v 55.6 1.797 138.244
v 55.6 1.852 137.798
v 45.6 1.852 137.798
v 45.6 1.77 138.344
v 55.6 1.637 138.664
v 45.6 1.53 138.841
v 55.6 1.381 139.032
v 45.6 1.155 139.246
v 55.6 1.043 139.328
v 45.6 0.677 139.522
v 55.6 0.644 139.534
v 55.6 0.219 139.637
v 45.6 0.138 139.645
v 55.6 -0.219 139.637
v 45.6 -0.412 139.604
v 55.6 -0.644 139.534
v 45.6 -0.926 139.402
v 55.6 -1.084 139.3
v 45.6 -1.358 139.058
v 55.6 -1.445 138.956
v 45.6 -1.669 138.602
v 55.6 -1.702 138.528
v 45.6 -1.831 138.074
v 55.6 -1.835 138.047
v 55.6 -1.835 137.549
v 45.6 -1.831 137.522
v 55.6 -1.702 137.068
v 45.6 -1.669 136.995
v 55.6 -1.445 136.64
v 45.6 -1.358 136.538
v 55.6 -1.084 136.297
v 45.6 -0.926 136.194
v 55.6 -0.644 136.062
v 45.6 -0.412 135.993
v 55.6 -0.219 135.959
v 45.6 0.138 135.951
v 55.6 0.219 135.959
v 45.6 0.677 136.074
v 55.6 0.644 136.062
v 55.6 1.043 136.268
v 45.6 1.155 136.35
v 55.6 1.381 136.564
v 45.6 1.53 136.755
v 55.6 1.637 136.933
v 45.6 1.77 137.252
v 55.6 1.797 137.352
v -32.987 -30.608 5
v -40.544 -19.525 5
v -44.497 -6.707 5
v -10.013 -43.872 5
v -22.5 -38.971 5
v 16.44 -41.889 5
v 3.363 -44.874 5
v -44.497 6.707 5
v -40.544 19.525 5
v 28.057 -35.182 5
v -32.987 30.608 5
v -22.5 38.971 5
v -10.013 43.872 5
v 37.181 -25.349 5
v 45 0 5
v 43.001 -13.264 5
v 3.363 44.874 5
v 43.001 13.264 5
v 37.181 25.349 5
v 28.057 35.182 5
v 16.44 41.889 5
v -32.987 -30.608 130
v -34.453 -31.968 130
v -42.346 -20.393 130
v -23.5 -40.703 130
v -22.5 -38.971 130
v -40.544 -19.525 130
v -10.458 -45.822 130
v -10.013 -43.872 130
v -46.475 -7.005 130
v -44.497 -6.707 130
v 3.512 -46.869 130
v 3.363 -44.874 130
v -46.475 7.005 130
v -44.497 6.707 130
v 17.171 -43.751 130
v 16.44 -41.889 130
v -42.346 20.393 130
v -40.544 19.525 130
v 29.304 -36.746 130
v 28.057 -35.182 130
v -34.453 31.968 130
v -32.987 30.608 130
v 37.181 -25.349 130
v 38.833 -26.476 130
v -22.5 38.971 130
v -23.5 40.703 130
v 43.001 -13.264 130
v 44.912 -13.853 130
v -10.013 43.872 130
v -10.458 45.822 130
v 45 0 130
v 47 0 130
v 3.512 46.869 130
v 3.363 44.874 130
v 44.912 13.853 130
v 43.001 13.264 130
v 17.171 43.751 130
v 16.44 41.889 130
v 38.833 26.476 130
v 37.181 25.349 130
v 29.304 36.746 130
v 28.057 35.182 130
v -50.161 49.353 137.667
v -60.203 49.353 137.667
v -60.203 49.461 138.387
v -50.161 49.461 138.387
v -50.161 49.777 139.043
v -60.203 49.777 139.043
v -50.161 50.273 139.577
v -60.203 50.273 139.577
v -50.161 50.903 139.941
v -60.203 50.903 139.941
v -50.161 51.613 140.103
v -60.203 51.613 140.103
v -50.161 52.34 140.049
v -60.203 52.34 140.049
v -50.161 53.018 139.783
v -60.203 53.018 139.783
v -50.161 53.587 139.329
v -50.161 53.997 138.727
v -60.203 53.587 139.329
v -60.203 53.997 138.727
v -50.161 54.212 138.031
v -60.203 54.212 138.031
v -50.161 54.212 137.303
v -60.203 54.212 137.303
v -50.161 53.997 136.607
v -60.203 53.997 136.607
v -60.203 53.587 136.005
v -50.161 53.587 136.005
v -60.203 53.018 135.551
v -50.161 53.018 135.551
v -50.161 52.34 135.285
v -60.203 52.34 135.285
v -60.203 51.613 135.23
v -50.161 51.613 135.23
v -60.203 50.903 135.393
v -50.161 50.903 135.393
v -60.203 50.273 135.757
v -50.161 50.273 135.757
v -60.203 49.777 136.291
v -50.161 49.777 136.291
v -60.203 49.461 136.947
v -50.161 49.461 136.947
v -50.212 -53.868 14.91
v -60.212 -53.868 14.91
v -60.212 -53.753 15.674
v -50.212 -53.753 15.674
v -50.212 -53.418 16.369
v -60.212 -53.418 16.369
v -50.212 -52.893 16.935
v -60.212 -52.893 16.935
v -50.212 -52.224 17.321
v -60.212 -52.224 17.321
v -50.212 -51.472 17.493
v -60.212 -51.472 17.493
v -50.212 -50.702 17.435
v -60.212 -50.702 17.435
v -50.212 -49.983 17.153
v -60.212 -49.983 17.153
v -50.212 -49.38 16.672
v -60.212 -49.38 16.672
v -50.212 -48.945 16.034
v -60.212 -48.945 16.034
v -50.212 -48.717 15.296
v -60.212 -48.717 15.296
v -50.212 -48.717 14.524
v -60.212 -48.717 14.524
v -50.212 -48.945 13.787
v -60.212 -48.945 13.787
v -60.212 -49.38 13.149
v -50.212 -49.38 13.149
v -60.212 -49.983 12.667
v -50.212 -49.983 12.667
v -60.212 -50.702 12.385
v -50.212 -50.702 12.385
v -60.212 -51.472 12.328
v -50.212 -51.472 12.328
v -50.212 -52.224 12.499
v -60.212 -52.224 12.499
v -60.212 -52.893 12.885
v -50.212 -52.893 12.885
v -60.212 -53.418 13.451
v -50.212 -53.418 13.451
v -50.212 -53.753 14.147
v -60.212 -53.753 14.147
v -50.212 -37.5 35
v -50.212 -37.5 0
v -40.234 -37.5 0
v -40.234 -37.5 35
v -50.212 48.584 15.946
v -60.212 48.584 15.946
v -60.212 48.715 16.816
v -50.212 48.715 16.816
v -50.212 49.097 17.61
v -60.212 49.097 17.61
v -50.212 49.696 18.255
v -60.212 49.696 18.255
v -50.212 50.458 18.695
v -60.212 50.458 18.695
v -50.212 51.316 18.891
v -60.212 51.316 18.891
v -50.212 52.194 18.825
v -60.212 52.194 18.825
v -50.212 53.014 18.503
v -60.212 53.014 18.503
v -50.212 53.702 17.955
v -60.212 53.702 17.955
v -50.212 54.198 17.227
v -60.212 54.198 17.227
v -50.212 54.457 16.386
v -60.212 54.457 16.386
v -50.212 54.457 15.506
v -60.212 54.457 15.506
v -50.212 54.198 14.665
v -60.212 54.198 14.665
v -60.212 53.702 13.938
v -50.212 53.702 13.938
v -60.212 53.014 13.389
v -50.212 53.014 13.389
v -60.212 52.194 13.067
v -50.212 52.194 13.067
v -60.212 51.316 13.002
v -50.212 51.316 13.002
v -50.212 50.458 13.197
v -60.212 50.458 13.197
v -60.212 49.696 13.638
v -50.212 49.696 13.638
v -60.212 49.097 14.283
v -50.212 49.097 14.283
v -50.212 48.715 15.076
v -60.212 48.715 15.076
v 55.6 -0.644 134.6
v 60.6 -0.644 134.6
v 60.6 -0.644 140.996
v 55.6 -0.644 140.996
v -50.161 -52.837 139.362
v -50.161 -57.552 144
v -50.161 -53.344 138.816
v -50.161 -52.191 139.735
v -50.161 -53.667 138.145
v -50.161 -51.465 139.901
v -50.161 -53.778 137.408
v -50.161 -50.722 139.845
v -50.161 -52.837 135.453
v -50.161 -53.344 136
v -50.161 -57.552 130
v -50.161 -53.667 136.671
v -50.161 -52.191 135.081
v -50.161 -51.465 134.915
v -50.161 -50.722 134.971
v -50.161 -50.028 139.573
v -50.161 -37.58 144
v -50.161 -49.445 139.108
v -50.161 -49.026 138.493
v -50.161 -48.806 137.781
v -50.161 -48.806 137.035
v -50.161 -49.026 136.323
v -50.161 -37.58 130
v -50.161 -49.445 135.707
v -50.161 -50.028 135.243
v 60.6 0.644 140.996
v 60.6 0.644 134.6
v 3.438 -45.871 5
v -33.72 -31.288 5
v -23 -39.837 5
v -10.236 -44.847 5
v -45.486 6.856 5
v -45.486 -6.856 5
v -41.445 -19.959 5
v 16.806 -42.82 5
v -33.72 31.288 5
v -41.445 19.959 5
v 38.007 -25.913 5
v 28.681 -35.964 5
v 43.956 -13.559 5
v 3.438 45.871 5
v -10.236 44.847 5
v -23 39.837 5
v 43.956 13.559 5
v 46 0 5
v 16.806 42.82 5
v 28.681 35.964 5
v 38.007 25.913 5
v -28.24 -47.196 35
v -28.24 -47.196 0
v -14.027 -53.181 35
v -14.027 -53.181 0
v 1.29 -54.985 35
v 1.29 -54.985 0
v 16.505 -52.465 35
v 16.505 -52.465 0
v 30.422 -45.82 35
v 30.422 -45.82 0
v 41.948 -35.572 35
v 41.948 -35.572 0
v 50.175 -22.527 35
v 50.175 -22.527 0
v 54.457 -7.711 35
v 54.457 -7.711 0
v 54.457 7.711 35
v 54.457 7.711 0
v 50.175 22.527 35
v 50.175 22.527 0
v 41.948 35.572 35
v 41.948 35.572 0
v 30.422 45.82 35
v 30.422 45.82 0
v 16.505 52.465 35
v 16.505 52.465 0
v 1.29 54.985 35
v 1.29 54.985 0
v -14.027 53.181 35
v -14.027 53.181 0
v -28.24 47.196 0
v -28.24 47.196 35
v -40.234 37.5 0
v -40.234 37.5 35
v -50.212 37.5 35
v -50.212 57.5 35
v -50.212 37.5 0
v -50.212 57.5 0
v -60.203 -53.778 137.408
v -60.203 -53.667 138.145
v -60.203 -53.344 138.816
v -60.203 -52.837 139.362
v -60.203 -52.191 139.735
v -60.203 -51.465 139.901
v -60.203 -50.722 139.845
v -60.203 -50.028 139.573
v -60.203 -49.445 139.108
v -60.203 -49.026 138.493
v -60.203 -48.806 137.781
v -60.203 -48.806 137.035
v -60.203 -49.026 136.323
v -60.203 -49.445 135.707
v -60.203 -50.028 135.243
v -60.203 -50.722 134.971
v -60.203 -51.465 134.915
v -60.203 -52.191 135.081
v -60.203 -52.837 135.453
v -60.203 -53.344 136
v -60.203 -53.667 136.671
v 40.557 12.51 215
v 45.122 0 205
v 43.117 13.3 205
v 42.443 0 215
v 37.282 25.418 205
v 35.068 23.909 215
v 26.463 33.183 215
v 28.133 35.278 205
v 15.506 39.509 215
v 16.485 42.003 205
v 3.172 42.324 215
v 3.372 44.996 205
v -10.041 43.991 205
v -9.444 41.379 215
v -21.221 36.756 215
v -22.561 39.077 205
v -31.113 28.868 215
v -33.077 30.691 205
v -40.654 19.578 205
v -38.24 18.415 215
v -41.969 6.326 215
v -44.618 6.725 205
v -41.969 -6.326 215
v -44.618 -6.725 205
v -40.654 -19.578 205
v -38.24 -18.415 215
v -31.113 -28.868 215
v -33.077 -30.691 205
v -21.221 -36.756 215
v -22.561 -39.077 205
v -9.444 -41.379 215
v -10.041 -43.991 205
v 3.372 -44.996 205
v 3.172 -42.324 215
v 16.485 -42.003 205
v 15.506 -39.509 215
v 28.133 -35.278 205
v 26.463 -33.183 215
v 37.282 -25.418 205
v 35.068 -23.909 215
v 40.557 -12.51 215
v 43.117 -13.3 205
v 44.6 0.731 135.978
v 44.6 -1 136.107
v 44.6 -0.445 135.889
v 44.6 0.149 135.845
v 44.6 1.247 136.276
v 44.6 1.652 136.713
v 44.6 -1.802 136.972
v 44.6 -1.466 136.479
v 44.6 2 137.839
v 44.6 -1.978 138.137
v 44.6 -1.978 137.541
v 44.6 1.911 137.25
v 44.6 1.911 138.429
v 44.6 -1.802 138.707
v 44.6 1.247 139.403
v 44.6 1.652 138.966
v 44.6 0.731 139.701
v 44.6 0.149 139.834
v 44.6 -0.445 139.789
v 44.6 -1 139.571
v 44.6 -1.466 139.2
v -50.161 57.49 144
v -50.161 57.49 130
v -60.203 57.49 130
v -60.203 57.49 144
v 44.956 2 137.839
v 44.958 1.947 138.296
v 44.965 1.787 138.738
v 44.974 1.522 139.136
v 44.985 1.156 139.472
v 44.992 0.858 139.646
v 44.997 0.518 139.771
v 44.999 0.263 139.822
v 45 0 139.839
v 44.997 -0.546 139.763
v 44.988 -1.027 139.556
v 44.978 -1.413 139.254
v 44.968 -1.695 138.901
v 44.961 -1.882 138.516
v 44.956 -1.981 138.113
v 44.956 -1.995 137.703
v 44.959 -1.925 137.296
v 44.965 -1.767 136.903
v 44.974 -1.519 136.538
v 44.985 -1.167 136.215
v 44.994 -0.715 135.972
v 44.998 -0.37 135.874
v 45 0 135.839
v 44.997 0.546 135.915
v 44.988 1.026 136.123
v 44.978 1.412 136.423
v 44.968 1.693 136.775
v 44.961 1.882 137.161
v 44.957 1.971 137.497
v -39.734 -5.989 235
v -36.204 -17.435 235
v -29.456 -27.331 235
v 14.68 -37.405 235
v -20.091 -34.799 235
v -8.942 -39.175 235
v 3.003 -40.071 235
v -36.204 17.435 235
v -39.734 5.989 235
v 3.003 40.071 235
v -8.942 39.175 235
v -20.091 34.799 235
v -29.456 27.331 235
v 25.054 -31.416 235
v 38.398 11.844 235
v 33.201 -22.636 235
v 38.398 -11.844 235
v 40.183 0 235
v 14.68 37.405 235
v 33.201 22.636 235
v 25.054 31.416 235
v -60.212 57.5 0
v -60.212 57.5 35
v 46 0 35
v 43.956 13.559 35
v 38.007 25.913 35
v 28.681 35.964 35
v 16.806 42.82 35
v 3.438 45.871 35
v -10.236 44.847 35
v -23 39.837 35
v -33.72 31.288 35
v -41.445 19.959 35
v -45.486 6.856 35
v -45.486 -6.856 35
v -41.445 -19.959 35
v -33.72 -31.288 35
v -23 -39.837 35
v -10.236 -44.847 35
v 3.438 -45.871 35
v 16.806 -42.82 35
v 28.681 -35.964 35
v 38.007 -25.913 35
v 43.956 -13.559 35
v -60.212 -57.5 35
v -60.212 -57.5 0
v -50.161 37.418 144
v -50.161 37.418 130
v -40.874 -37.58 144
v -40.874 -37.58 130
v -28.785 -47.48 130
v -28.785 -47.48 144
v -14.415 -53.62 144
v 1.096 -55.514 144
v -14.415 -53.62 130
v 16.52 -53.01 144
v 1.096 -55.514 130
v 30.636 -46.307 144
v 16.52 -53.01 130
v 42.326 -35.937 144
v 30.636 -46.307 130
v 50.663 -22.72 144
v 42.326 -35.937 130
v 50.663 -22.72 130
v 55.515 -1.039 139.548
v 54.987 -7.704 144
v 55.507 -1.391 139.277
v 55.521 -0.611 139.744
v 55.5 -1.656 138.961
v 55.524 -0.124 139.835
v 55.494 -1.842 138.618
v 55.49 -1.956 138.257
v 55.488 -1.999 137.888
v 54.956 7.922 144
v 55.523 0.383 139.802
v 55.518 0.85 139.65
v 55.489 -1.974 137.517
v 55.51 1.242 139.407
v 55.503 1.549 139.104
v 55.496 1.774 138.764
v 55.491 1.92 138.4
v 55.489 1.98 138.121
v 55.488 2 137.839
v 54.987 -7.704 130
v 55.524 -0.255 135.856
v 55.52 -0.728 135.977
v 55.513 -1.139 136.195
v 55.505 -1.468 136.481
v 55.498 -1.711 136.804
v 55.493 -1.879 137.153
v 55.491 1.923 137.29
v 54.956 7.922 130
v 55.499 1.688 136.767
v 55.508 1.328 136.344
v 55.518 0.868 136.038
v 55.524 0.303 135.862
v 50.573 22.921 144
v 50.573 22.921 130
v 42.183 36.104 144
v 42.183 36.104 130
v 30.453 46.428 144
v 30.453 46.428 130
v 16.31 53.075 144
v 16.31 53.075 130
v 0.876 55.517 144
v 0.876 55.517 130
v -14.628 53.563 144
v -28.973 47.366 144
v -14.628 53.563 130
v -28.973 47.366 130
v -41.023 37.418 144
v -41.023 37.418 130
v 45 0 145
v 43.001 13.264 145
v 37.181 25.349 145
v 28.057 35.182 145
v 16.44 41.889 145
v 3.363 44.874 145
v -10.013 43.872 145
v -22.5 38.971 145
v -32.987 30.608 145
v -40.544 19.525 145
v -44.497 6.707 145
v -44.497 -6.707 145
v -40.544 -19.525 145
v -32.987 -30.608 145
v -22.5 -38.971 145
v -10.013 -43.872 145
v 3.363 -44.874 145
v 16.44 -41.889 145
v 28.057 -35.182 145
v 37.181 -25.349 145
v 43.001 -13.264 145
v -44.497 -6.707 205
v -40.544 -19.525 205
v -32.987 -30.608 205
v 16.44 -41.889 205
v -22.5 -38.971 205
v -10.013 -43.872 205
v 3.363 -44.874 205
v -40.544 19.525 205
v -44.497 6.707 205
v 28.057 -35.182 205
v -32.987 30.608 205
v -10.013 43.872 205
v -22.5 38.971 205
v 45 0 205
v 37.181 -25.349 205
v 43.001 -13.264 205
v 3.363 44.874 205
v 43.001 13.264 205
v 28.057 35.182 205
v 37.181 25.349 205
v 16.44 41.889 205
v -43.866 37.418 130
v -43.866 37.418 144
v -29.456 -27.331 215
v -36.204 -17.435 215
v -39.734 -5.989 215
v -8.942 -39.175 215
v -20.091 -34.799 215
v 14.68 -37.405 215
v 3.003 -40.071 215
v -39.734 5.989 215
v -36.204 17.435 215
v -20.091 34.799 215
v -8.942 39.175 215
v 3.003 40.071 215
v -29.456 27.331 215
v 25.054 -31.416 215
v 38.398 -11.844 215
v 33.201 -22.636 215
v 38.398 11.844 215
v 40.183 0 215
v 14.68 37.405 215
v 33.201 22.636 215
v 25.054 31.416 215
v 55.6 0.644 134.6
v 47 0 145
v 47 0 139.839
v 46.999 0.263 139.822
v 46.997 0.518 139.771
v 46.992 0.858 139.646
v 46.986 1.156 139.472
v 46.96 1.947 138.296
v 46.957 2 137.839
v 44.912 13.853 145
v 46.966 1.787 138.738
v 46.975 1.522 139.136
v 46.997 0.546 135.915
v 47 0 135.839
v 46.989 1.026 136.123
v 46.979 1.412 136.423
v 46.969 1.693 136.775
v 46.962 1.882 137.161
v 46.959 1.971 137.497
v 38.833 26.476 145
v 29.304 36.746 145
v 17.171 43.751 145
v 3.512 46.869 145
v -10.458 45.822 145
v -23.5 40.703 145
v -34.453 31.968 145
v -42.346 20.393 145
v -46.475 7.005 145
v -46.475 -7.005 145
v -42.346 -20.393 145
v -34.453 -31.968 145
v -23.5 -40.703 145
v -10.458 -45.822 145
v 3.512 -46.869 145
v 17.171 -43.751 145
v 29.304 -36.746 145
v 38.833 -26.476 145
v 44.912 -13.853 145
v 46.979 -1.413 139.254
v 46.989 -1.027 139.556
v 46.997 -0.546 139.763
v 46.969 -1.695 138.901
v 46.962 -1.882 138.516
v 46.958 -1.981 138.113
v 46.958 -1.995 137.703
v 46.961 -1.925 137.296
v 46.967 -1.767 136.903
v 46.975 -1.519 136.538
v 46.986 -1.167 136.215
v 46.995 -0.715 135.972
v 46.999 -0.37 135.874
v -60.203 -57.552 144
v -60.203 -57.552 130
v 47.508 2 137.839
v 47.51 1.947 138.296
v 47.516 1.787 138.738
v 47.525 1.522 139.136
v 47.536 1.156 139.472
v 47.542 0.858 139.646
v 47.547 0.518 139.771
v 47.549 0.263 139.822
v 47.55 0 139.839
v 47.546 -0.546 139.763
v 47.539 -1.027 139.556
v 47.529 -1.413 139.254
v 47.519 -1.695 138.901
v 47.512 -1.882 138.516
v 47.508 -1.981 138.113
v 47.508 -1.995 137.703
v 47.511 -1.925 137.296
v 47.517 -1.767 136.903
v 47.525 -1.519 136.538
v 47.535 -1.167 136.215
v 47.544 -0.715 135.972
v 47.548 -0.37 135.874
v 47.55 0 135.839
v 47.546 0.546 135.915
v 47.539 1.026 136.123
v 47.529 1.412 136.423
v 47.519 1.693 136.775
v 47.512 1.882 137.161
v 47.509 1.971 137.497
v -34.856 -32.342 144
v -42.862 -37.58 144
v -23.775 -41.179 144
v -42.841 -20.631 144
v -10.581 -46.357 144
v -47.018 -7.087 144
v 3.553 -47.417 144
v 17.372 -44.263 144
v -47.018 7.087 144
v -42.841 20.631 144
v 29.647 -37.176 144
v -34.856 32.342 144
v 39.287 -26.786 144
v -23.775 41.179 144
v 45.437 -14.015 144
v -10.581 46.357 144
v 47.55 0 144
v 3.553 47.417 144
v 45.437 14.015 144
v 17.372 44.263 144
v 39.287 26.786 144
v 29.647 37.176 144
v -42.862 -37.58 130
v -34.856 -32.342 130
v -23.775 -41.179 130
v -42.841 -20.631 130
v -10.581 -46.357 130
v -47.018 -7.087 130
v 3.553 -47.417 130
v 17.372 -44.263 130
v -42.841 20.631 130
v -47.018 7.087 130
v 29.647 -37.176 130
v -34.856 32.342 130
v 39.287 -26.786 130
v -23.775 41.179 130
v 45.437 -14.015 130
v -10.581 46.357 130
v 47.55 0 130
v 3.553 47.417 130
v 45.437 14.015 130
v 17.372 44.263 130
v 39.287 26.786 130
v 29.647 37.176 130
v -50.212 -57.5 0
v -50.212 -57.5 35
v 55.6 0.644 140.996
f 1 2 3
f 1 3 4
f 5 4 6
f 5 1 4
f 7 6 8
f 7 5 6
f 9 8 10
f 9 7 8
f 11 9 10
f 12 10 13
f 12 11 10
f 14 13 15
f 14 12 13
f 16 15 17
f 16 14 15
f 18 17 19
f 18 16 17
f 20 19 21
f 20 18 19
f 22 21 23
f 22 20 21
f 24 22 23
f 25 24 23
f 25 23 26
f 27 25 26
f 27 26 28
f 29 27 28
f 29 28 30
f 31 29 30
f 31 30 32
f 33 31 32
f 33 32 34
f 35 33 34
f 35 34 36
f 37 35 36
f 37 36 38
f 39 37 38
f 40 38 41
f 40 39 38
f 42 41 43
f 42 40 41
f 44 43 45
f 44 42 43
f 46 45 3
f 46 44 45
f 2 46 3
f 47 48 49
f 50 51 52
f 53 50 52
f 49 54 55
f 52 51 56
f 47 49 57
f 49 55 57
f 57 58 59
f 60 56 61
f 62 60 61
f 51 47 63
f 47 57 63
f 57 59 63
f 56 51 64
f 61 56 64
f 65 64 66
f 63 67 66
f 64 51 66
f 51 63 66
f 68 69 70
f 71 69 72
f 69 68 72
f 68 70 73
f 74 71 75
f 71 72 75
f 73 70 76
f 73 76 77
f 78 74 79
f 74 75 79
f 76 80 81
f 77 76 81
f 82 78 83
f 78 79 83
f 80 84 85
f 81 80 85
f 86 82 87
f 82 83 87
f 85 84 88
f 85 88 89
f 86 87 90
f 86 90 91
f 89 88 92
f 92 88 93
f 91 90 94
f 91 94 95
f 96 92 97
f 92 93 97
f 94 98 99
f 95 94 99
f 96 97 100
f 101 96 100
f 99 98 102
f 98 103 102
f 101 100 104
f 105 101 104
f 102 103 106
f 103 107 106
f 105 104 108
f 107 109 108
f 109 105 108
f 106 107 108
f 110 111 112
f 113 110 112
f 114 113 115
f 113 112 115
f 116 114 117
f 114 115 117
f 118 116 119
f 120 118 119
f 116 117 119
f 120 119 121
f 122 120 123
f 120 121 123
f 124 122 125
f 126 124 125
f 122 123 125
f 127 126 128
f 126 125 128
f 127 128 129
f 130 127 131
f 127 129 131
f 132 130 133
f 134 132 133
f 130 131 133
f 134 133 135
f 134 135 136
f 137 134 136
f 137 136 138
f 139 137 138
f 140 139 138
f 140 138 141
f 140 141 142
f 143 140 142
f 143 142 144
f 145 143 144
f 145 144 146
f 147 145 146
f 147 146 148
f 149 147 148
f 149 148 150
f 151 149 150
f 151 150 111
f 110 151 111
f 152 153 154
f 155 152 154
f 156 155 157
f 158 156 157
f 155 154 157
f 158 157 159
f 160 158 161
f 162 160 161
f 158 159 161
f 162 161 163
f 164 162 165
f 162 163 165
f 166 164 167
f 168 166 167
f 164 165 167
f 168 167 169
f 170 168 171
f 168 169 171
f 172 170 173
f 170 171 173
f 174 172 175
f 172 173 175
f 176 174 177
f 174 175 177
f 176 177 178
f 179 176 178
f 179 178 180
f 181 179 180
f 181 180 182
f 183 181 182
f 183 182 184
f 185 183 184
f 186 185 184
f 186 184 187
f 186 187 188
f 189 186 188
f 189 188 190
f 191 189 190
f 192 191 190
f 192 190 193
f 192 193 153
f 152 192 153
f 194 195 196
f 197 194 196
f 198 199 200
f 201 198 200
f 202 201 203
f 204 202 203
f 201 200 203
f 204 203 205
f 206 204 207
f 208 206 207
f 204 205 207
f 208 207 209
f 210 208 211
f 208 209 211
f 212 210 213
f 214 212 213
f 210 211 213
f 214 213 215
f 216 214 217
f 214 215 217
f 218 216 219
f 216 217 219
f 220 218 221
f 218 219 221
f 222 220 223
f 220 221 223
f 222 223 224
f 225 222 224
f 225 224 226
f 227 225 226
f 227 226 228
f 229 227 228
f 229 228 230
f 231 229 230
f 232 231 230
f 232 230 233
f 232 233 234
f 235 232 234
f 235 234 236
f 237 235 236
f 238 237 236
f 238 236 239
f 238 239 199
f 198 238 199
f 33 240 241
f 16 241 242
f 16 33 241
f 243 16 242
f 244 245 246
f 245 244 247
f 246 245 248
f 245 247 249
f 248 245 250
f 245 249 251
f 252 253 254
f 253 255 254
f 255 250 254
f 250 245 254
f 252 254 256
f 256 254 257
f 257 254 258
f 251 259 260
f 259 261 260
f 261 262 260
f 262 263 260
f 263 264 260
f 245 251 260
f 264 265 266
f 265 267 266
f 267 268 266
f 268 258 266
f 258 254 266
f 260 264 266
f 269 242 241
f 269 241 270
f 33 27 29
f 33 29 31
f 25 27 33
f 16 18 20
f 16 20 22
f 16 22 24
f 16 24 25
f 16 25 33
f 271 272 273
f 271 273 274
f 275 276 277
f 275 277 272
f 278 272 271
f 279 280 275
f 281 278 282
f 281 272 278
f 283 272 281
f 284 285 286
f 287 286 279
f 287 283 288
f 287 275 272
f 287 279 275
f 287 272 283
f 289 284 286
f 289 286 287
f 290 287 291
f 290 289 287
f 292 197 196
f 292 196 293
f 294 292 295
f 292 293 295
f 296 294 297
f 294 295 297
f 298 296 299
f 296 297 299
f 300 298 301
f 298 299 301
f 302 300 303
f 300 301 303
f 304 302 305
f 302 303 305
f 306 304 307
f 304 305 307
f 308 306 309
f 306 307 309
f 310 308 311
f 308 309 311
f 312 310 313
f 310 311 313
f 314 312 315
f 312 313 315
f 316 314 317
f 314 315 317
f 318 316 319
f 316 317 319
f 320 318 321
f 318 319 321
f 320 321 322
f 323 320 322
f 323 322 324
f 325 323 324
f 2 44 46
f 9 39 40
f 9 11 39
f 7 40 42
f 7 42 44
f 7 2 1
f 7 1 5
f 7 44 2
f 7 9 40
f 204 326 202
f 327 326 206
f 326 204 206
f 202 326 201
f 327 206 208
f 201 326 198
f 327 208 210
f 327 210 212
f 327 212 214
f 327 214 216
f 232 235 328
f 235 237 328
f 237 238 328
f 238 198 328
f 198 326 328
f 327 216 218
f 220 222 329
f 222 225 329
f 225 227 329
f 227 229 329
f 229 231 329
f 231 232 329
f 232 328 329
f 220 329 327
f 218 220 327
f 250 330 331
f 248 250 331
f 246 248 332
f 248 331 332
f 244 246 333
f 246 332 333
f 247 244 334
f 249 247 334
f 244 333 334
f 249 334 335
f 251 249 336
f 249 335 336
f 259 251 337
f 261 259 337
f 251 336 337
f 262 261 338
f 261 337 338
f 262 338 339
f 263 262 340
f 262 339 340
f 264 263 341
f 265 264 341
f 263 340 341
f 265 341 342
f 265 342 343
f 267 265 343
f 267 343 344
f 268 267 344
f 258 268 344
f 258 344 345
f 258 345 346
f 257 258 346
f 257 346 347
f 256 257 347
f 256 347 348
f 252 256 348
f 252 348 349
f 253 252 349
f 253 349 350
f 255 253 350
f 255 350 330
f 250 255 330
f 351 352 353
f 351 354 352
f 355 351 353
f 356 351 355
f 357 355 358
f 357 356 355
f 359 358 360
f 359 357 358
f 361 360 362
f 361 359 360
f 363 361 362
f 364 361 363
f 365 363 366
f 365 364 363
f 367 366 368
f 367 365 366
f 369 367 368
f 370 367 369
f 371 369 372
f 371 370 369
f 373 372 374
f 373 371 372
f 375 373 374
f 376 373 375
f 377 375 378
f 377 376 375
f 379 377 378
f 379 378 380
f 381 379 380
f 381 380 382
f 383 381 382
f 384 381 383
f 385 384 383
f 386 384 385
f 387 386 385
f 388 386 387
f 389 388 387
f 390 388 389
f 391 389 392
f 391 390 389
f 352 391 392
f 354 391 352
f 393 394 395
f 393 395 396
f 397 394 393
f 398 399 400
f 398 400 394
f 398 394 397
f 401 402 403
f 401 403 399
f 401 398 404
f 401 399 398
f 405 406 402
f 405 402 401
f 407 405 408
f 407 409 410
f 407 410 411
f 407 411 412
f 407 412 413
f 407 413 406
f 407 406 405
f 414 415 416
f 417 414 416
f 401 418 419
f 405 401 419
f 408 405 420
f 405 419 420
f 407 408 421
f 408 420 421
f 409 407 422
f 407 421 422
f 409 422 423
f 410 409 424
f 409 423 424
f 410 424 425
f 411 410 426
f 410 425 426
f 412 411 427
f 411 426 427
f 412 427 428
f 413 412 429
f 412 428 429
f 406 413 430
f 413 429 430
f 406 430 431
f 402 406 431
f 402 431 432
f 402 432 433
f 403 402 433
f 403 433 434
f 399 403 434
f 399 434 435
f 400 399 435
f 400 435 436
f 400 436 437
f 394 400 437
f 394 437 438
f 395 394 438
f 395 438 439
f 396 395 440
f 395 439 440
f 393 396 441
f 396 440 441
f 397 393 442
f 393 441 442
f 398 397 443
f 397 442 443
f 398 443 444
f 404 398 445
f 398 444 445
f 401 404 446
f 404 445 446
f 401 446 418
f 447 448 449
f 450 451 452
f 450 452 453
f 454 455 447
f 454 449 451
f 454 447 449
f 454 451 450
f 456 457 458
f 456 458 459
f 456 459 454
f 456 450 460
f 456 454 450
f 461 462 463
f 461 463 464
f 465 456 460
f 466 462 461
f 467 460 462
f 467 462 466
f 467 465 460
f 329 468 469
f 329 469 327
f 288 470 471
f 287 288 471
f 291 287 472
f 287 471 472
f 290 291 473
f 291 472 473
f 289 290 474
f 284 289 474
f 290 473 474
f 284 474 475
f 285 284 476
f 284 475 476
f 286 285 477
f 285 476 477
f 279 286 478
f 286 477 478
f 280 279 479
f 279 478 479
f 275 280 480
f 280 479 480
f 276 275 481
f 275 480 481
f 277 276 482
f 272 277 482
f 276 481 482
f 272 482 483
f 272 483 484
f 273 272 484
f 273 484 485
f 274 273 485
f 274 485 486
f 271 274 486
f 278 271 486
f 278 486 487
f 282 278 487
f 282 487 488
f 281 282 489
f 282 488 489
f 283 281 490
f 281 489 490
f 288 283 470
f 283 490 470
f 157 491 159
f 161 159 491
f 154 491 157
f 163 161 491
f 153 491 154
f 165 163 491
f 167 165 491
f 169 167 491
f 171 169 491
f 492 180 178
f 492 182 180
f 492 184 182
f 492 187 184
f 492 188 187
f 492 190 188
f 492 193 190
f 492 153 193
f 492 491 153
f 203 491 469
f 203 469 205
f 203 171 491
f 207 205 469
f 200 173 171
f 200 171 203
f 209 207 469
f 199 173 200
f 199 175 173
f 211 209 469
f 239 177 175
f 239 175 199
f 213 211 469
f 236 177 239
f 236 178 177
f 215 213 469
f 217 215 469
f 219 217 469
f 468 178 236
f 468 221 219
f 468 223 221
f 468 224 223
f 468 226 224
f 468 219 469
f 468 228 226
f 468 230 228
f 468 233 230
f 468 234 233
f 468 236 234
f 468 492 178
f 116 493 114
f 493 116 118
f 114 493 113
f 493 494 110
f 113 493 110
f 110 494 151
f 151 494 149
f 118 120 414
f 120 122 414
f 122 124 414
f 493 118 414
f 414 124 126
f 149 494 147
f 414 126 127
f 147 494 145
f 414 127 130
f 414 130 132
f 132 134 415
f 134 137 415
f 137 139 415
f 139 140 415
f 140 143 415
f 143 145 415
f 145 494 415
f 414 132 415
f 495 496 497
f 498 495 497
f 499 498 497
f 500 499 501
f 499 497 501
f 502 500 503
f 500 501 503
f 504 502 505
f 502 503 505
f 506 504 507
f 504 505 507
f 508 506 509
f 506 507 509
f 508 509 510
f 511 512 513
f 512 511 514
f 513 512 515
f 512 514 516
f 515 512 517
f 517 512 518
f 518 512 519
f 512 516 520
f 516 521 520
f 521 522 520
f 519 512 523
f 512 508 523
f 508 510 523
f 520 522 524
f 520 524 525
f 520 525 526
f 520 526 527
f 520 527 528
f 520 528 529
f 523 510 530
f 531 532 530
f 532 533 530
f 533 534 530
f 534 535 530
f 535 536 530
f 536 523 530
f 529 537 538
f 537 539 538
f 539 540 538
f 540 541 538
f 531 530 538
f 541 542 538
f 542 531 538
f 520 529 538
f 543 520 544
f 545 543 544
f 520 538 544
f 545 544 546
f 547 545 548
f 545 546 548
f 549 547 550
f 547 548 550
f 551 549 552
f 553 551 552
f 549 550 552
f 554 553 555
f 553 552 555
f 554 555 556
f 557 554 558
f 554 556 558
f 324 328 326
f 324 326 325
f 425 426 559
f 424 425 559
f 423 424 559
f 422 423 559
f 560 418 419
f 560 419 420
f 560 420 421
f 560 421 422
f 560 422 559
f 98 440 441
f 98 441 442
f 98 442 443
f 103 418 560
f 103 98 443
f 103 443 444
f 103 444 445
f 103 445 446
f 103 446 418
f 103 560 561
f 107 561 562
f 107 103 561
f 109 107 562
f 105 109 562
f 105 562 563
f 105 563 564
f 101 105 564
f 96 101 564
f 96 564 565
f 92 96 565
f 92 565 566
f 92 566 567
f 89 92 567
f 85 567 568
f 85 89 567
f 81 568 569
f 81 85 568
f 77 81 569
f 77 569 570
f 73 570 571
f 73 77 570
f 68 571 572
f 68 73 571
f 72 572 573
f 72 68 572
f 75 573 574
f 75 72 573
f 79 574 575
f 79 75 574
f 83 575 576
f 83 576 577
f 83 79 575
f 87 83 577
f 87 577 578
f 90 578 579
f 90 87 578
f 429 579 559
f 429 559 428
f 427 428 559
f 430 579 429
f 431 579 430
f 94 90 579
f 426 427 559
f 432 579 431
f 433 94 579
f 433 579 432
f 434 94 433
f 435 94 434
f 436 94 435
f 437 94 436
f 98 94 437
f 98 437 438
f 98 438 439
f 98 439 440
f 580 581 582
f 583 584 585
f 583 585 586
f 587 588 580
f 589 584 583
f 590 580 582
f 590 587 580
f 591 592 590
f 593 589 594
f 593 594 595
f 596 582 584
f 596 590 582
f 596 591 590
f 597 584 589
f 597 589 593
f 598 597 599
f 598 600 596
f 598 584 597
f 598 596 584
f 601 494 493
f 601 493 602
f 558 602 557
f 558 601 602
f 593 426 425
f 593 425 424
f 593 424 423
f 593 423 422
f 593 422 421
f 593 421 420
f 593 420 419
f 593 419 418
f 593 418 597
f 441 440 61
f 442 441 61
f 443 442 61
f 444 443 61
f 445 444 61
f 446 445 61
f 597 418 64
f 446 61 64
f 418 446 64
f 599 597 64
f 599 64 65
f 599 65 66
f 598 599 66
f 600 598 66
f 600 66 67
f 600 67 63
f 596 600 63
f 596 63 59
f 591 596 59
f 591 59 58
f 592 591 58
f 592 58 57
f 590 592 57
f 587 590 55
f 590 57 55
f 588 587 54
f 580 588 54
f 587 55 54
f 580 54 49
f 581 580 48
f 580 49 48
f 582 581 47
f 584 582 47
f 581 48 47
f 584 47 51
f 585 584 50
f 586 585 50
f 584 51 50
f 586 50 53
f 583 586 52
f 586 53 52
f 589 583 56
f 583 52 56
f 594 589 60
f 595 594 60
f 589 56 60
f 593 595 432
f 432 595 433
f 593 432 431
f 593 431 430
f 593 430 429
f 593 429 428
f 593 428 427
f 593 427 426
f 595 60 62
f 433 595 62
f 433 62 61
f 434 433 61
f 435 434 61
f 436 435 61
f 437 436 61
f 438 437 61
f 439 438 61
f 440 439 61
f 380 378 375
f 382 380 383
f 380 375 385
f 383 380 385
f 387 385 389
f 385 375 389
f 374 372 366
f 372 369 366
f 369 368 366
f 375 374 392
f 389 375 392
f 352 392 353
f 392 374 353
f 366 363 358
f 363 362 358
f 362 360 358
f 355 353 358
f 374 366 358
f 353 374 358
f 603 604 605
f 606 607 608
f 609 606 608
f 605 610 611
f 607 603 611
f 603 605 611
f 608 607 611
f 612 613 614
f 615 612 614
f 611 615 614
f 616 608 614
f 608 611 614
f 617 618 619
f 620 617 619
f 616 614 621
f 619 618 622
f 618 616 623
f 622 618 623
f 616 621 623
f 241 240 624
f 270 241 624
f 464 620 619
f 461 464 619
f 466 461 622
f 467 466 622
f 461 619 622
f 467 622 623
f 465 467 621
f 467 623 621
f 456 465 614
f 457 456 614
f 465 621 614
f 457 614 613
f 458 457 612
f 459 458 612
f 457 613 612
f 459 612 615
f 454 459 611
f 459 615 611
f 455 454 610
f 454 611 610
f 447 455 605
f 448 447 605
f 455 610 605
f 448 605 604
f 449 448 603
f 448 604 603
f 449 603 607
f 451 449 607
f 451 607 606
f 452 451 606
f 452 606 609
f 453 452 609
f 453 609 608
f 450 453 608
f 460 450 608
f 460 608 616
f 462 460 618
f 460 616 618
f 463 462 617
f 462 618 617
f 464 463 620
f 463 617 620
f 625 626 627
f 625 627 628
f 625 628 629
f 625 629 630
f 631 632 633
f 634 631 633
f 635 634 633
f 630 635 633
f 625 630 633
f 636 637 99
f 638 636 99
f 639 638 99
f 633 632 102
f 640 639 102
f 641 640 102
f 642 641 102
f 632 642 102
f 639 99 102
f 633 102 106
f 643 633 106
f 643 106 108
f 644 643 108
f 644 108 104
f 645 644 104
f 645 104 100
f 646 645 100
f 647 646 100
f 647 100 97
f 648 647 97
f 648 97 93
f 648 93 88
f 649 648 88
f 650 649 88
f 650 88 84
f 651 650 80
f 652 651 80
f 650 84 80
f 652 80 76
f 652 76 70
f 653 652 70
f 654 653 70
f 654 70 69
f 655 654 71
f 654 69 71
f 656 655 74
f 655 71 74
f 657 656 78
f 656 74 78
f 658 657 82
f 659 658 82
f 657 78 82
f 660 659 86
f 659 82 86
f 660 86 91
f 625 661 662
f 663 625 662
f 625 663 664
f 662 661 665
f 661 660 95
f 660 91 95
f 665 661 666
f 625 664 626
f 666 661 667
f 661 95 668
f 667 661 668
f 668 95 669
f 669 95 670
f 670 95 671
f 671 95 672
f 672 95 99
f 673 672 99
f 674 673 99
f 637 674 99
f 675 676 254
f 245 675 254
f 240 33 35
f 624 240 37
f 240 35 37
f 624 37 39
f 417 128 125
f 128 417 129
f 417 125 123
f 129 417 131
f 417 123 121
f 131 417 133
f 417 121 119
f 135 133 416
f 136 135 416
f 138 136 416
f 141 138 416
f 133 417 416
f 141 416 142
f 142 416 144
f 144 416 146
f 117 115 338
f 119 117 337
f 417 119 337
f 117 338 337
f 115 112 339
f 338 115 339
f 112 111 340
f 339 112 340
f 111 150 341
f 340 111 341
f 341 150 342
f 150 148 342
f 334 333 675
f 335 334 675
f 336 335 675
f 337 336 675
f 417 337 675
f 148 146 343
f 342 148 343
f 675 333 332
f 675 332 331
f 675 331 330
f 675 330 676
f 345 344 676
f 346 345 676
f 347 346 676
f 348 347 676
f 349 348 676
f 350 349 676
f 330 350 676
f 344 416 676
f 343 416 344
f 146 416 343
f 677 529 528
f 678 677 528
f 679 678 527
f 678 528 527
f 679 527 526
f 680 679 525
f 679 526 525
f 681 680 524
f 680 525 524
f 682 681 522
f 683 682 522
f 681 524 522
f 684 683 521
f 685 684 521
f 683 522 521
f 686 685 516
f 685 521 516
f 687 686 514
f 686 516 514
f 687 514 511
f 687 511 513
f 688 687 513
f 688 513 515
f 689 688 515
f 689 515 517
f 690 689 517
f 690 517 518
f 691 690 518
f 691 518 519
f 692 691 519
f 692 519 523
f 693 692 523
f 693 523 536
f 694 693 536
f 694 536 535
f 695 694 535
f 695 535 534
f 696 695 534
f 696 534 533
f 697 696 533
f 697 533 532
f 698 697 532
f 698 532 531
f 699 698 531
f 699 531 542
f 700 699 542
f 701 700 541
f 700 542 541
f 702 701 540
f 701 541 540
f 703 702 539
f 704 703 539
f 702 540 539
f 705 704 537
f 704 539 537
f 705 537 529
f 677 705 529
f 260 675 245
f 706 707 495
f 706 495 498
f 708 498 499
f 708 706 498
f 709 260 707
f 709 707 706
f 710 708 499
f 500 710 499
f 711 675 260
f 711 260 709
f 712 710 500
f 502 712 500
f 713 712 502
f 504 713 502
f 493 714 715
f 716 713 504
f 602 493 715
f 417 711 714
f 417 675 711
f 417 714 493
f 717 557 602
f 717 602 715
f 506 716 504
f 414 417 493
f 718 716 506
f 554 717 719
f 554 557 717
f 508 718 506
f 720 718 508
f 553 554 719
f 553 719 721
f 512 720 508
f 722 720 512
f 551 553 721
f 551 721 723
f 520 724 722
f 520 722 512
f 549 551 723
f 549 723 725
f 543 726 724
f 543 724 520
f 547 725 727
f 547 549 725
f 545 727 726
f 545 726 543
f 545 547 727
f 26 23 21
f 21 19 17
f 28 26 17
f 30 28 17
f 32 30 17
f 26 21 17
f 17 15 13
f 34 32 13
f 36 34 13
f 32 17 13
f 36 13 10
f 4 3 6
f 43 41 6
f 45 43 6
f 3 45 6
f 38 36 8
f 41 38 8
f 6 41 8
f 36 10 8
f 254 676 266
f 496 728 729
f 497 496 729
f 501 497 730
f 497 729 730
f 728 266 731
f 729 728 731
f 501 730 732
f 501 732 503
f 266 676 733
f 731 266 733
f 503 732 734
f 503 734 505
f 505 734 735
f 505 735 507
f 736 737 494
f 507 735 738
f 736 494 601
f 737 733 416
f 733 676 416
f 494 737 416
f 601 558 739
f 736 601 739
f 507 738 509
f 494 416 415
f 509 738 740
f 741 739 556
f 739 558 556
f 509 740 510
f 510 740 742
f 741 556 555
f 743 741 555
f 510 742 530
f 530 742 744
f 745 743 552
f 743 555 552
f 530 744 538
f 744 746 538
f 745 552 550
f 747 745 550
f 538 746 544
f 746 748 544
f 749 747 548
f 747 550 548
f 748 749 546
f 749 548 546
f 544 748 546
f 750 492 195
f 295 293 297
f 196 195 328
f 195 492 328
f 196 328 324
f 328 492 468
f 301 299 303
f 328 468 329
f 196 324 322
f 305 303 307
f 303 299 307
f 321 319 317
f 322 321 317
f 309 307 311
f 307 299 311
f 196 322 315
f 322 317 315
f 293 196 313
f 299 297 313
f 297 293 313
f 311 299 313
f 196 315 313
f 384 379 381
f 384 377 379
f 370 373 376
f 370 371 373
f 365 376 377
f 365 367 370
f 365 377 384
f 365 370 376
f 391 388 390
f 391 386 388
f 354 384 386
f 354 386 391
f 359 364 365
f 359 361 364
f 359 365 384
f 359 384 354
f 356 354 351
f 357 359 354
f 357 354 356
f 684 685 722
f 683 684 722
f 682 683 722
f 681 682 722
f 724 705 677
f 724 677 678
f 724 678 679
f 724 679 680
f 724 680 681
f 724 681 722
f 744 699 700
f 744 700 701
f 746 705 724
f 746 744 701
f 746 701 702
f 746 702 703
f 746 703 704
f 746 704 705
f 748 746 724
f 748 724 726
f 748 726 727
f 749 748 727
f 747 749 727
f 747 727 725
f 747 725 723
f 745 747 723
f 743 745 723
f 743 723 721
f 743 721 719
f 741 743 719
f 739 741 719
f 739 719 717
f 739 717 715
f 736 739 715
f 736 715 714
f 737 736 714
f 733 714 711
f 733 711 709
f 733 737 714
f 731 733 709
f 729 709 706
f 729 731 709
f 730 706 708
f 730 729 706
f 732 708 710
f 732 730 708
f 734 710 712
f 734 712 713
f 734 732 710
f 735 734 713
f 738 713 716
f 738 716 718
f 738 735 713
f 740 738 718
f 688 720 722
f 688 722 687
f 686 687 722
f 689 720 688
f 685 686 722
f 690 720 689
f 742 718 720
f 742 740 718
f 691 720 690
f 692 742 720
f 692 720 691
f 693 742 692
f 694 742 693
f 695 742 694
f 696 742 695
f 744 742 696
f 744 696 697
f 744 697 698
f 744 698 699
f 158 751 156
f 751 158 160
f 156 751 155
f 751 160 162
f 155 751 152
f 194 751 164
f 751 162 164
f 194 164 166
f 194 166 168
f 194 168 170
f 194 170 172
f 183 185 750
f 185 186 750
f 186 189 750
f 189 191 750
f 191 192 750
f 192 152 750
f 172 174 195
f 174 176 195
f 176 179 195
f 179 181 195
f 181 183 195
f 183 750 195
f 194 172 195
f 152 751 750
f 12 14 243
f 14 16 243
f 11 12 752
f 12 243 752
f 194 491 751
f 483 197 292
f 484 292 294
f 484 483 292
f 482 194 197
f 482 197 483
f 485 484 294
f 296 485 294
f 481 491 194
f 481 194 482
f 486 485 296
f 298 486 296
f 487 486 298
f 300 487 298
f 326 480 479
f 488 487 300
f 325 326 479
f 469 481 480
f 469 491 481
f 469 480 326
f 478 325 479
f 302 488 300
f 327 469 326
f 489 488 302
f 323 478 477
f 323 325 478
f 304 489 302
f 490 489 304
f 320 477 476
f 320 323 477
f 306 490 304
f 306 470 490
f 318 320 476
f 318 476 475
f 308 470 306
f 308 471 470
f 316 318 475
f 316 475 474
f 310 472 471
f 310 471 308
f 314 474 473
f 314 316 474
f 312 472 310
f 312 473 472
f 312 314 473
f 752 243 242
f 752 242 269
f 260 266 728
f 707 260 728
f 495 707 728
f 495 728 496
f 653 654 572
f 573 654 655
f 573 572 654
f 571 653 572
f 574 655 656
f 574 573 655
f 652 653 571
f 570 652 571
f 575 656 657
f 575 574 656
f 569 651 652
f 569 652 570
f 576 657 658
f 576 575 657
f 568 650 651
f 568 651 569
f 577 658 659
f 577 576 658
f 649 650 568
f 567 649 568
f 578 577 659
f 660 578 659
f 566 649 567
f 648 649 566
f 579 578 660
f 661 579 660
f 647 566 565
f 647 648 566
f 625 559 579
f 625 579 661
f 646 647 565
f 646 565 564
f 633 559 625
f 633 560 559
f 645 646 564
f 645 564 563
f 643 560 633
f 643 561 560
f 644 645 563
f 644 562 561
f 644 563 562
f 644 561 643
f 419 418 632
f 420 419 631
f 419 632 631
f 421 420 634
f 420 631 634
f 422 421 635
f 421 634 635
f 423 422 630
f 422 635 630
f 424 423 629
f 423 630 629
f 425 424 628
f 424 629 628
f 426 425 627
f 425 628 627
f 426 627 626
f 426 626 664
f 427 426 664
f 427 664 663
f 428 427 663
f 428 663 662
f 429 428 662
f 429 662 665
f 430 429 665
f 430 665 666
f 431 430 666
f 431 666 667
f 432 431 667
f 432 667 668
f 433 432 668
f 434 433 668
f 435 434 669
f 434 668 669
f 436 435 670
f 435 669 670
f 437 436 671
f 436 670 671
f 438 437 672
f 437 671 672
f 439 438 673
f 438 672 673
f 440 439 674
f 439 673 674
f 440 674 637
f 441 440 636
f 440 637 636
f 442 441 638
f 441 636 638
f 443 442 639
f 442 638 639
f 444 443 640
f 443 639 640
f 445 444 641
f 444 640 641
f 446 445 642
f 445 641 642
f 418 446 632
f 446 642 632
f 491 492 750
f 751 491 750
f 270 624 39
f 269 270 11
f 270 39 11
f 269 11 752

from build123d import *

# Parameters (mm, degrees)
F1_W      = 10
F1_H      = 115
F2_DEPTH  = 35
F0_R      = 55
F3_DEPTH  = 35
F5_W      = 10
F5_H      = 16
F6_DEPTH  = 35
F7_R      = 46
F8_DEPTH  = 30
F9_R      = 45
F10_DEPTH = 200
F12_R     = 47
F12_R_2   = 45
F13_DEPTH = 15
F14_R     = 55.5243387496
F14_R_2   = 47.5495855214
F15_DEPTH = 14
F16_W     = 2.7371235192
F16_H     = 3.1020753086
F16_W_2   = 3.740735352
F16_H_2   = 3.740735352
F17_DEPTH = 14
F18_R     = 45.1221463485
F19_DEPTH = 10
F19_TAPER = 15
F20_R     = 40.1828666556
F21_DEPTH = 20
F22_R     = 2.589803189
F22_R_2   = 2.9528303604
F22_R_3   = 2.4432144549
F22_R_4   = 2.5
F23_DEPTH = 25
F24_DEPTH = 15
F26_R     = 2
F27_DEPTH = 11
F28_R     = 1.8519150729
F29_DEPTH = 10
F30_W     = 1.2878538109
F30_H     = 6.3951611519
F31_DEPTH = 5


with BuildPart() as f2:
    # F1 (on Top) → F2 (new body)
    with BuildSketch(Plane.XY):
        with Locations((-55.2120134234, 0)):
            Rectangle(F1_W, F1_H)
    extrude(amount=F2_DEPTH)

    # F0 (on Top) → F3 (join)
    with BuildSketch(Plane.XY):
        Circle(F0_R)
    extrude(amount=F3_DEPTH)

    # F5 (on Top) → F6 (join)
    with BuildSketch(Plane.XY):
        with Locations((-45.2120134234, 29.5)):
            Rectangle(F5_W, F5_H)
        with Locations((-45.2120134234, -29.5)):
            Rectangle(F5_W, F5_H)
    extrude(amount=F6_DEPTH)

    # F7 (on face) → F8 (cut)
    with BuildSketch(Plane.XY.offset(35)):
        Circle(F7_R)
    extrude(amount=-F8_DEPTH, mode=Mode.SUBTRACT)


with BuildPart() as f10:
    # F9 (on face) → F10 (new body)
    with BuildSketch(Plane.XY.offset(5)):
        Circle(F9_R)
    extrude(amount=F10_DEPTH)


with BuildPart() as f13:
    # F12 (on offset) → F13 (new body)
    with BuildSketch(Plane.XY.offset(130)):
        Circle(F12_R)
        Circle(F12_R_2, mode=Mode.SUBTRACT)
    extrude(amount=F13_DEPTH)


with BuildPart() as f15:
    # F14 (on offset) → F15 (new body)
    with BuildSketch(Plane.XY.offset(130)):
        Circle(F14_R)
        Circle(F14_R_2, mode=Mode.SUBTRACT)
    extrude(amount=F15_DEPTH)

    # F16 (on offset) → F17 (join)
    with BuildSketch(Plane.XY.offset(130)):
        Polygon((-60.2025799453, 57.4897415936), (-60.2025799453, -57.5523227453), (-50.1614175737, -57.5523227453), (-50.1614175737, -37.5796668231), (-50.1614175737, -22.9816753417), (-50.1614175737, 23.2757031918), (-50.1614175737, 37.4175049365), (-50.1614175737, 57.4897415936), align=None)
        Polygon((-50.1614175737, -22.9816753417), (-50.1614175737, -37.5796668231), (-42.8624227643, -37.5796668231), (-42.8624227643, -34.4775915146), (-42.8624227643, -22.9816753417), align=None)
        with Locations((-41.4938610047, -36.0286291689)):
            Rectangle(F16_W, F16_H)
        Polygon((-43.8660345972, 37.4175049365), (-50.1614175737, 37.4175049365), (-50.1614175737, 23.2757031918), (-43.8660345972, 23.2757031918), (-43.8660345972, 33.6767695844), align=None)
        with Locations((-41.9956669211, 35.5471372604)):
            Rectangle(F16_W_2, F16_H_2)
    extrude(amount=F17_DEPTH)


with BuildPart() as f19:
    # F18 (on face) → F19 (new body)
    with BuildSketch(Plane.XY.offset(205)):
        Circle(F18_R)
    extrude(amount=F19_DEPTH, taper=F19_TAPER)


with BuildPart() as f21:
    # F20 (on face) → F21 (new body)
    with BuildSketch(Plane.XY.offset(215)):
        Circle(F20_R)
    extrude(amount=F21_DEPTH)


with BuildPart() as f23_tool:
    # F22 (on face) → F23 (new body)
    with BuildSketch(Plane(origin=(-60.2120134234, 0, 0), x_dir=(0, -1, 0), z_dir=(-1, 0, 0))):
        with Locations((51.278103143, 14.9101959541)):
            Circle(F22_R)
        with Locations((-51.5370927751, 15.9461162984)):
            Circle(F22_R_2)
        with Locations((-51.7960712314, 137.6668810844)):
            Circle(F22_R_3)
        with Locations((51.2781068683, 137.4078989029)):
            Circle(F22_R_4)
    extrude(amount=-F23_DEPTH)


with BuildPart() as f2_1:
    add(f2.part)

    # F23: cut by f23_tool
    add(f23_tool.part, mode=Mode.SUBTRACT)

    # F22 (on face) → F24 (cut)
    with BuildSketch(Plane(origin=(-60.2120134234, 0, 0), x_dir=(0, -1, 0), z_dir=(-1, 0, 0))):
        with Locations((51.278103143, 14.9101959541)):
            Circle(F22_R)
        with Locations((-51.5370927751, 15.9461162984)):
            Circle(F22_R_2)
        with Locations((-51.7960712314, 137.6668810844)):
            Circle(F22_R_3)
        with Locations((51.2781068683, 137.4078989029)):
            Circle(F22_R_4)
    extrude(amount=-F24_DEPTH, mode=Mode.SUBTRACT)


with BuildPart() as f15_1:
    add(f15.part)

    # F23: cut by f23_tool
    add(f23_tool.part, mode=Mode.SUBTRACT)


with BuildPart() as f27_tool:
    # F26 (on offset) → F27 (new body)
    with BuildSketch(Plane.YZ.offset(55.6)):
        with Locations((0, 137.8392875195)):
            Circle(F26_R)
    extrude(amount=-F27_DEPTH)


with BuildPart() as f10_1:
    add(f10.part)

    # F27: cut by f27_tool
    add(f27_tool.part, mode=Mode.SUBTRACT)


with BuildPart() as f13_1:
    add(f13.part)

    # F27: cut by f27_tool
    add(f27_tool.part, mode=Mode.SUBTRACT)


with BuildPart() as f15_2:
    add(f15_1.part)

    # F27: cut by f27_tool
    add(f27_tool.part, mode=Mode.SUBTRACT)


with BuildPart() as f29:
    # F28 (on offset) → F29 (new body)
    with BuildSketch(Plane.YZ.offset(55.6)):
        with Locations((0, 137.7980560064)):
            Circle(F28_R)
    extrude(amount=-F29_DEPTH)

    # F30 (on face) → F31 (join)
    with BuildSketch(Plane.YZ.offset(55.6)):
        with Locations((0, 137.7980560064)):
            Rectangle(F30_W, F30_H)
    extrude(amount=F31_DEPTH)


solid = Compound([f19.part, f21.part, f2_1.part, f10_1.part, f13_1.part, f15_2.part, f29.part])
